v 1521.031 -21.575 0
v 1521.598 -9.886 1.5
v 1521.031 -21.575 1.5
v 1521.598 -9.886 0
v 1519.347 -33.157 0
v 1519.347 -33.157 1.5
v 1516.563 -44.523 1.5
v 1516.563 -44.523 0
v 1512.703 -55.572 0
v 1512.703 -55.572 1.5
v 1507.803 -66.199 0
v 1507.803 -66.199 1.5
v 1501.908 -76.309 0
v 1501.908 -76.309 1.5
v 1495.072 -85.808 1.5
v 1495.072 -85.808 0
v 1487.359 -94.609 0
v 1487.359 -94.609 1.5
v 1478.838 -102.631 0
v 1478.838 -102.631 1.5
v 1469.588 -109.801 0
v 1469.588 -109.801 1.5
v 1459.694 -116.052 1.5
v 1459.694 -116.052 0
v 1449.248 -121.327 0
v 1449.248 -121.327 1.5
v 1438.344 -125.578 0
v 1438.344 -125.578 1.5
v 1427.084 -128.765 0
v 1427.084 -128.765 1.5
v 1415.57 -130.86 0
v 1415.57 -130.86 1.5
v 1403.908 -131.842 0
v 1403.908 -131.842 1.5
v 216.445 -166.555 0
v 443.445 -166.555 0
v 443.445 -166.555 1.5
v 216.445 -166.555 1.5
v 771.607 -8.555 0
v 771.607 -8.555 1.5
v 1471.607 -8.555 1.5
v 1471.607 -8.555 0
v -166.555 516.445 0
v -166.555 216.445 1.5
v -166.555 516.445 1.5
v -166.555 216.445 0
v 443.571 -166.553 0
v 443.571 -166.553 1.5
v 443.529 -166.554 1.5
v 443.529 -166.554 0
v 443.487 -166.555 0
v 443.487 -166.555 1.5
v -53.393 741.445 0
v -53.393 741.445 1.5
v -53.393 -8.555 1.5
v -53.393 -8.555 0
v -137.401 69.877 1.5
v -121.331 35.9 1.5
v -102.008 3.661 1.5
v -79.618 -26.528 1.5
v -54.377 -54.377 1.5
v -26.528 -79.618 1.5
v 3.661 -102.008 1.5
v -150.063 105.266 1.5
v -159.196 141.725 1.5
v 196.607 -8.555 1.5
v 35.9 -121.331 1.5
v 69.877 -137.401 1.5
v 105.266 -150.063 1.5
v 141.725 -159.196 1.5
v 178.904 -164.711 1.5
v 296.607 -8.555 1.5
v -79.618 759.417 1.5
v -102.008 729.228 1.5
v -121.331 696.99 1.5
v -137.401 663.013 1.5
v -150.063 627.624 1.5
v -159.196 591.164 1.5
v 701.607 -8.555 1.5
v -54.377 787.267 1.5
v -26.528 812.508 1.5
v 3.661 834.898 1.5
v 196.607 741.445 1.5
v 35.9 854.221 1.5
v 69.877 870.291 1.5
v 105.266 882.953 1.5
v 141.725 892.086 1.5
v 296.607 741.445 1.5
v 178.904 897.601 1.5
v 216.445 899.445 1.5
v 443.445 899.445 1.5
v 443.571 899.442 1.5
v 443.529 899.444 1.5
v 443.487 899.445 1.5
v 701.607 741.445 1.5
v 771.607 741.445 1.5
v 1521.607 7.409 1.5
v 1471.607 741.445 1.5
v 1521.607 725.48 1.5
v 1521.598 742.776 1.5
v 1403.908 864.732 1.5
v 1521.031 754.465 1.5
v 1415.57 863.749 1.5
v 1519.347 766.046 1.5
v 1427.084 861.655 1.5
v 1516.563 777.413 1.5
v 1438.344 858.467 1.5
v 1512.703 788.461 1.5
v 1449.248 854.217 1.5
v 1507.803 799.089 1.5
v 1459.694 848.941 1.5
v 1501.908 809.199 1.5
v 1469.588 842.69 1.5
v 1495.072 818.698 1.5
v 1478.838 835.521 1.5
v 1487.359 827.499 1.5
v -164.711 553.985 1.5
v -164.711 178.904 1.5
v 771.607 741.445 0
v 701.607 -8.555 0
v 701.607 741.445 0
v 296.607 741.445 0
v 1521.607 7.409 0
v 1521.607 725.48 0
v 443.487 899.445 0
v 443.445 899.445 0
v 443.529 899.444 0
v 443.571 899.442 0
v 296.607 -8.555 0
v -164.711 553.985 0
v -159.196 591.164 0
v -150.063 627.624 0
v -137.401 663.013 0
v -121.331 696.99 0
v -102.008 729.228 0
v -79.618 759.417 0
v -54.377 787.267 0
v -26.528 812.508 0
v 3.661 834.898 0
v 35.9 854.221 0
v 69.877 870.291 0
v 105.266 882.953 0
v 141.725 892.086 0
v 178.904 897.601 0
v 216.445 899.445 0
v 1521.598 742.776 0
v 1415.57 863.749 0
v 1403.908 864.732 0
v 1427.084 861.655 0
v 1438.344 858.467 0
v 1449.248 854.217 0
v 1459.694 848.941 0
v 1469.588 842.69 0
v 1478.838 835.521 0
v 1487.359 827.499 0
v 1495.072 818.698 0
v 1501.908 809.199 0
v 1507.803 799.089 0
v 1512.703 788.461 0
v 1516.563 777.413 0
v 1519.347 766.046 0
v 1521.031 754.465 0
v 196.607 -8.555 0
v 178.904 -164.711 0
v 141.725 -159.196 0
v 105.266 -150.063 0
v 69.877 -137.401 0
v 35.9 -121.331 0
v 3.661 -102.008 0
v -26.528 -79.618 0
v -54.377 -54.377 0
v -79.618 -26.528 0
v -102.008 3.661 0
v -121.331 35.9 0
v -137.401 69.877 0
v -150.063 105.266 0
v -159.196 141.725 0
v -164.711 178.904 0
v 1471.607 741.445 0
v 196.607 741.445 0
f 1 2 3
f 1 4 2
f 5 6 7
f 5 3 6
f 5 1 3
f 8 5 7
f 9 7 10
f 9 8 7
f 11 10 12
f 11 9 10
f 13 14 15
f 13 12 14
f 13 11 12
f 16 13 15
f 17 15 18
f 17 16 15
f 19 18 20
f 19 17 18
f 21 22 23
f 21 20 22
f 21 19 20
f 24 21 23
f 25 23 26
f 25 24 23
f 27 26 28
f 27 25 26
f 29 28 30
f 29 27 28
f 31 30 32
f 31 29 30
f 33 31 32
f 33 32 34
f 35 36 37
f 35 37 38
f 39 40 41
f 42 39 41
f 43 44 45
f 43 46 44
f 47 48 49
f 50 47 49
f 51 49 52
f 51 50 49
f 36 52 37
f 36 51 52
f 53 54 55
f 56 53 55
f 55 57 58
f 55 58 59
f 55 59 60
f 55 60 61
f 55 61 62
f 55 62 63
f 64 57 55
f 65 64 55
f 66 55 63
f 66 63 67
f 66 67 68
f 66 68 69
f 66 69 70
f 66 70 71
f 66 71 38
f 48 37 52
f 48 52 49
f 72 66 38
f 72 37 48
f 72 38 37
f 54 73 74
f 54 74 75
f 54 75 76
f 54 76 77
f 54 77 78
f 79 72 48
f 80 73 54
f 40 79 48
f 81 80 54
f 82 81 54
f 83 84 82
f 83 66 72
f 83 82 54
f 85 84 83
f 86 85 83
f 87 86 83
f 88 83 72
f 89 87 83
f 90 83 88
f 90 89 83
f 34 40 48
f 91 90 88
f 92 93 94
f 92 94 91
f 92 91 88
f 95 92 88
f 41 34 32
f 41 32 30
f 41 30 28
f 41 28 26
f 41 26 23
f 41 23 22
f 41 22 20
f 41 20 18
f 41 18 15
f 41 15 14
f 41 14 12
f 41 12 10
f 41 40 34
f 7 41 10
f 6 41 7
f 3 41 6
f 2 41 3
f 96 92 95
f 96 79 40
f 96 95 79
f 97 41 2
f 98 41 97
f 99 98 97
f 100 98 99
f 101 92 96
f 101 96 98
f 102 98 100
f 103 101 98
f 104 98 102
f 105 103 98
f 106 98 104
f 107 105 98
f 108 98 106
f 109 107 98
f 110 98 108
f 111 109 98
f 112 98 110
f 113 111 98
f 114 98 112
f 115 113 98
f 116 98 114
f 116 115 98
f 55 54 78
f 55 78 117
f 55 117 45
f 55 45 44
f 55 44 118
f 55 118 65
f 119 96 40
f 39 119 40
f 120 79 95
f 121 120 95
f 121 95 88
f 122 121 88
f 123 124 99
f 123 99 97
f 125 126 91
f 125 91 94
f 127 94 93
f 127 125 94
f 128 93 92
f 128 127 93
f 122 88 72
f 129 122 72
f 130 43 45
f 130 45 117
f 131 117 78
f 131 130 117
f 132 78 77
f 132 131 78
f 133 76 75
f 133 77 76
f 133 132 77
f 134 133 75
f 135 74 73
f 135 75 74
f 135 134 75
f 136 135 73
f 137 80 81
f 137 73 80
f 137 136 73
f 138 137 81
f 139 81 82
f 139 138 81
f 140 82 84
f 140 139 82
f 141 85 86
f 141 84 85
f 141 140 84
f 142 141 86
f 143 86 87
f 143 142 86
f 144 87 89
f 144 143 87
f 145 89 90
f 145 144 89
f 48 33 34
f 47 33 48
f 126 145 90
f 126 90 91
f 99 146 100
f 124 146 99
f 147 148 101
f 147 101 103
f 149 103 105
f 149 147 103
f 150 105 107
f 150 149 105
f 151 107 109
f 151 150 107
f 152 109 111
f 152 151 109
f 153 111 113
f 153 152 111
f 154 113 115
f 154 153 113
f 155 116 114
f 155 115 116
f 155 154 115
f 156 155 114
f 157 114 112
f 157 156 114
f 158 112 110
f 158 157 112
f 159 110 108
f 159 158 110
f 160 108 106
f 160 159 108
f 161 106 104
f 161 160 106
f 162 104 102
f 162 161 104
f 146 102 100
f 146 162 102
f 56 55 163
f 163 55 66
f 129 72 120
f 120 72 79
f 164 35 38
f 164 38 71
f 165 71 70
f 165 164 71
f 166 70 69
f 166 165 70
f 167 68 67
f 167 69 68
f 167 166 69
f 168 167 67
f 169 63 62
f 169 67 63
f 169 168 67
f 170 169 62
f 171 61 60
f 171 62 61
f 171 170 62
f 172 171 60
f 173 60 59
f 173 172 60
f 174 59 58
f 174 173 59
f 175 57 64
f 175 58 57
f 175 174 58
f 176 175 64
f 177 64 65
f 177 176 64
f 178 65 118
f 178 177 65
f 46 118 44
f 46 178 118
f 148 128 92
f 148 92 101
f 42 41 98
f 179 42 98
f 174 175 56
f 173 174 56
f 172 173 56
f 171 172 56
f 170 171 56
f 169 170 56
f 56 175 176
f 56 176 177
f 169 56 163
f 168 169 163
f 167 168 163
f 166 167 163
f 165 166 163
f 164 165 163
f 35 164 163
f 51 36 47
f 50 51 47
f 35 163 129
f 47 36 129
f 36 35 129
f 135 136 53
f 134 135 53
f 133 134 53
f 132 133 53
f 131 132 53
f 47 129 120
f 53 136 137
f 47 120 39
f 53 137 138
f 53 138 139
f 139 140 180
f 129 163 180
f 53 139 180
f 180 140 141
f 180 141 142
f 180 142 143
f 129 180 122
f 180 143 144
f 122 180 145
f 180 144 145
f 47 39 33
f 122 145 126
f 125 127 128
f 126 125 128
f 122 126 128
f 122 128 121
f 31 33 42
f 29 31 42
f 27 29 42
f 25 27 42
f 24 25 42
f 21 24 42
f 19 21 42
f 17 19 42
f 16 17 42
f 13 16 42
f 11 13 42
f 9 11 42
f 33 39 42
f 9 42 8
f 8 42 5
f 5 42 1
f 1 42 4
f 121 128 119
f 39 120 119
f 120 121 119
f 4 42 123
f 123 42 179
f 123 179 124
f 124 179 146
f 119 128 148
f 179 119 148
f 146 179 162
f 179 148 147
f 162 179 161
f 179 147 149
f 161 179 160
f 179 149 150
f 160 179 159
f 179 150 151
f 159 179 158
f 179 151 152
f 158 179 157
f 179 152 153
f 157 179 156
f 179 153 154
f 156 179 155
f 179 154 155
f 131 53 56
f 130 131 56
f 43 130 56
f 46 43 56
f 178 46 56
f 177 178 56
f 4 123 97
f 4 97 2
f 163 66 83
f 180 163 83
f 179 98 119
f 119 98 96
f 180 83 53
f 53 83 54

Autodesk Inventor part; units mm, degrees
ref_plane "YZ Plane" through (0, 0, 0) normal (1, 0, 0) x (0, 1, 0)
ref_plane "XZ Plane" through (0, 0, 0) normal (0, 1, 0) x (-1, 0, 0)
ref_plane "XY Plane" through (0, 0, 0) normal (0, 0, 1) x (1, 0, 0)
sketch "Sketch1" plane through (0, 0, 0) normal (0, 0, 1) x (1, 0, 0)
  arc A0 (216.4448, 899.4448) -> (-166.5552, 516.4448) centre (216.4448, 516.4448) ccw
  line L0 (-166.5552, 216.4448) -> (-166.5552, 516.4448)
  arc A1 (-166.5552, 216.4448) -> (216.4448, -166.5552) centre (216.4448, 216.4448) ccw
  line L1 (443.4448, -166.5552) -> (216.4448, -166.5552)
  line L2 (216.4448, 899.4448) -> (443.4448, 899.4448)
  line L3 (443.5712, 899.4425) -> (1403.908, 864.732)
  line L4 (1403.908, -131.8425) -> (443.5712, -166.5529)
  arc A2 (443.4448, -166.5552) -> (443.5712, -166.5529) centre (443.4448, -163.0552) ccw
  arc A3 (443.5712, 899.4425) -> (443.4448, 899.4448) centre (443.4448, 895.9448) ccw
  arc A4 (1521.5977, 742.7757) -> (1403.908, 864.732) centre (1399.4977, 742.7117) ccw
  line L5 (1521.5977, 742.7757) -> (1521.6067, 725.4805)
  line L6 (1521.6067, 7.4091) -> (1521.5977, -9.8861)
  arc A5 (1403.908, -131.8425) -> (1521.5977, -9.8861) centre (1399.4977, -9.8222) ccw
  line L7 (1521.6067, 725.4805) -> (1521.6067, 7.4091)
  point P0 (0, 0)
extrude "Plate1" add sketch "Sketch1" along normal blind 1.5
sketch "Sketch2" plane through (0, 0, 1.5) normal (0, 0, 1) x (1, 0, 0)
  line L0 (771.6067, -8.5552) -> (1471.6067, -8.5552)
  line L1 (1471.6067, -8.5552) -> (1471.6067, 741.4448)
  line L2 (1471.6067, 741.4448) -> (771.6067, 741.4448)
  line L3 (771.6067, 741.4448) -> (771.6067, -8.5552)
  arc A0 (443.5712, 899.4425) -> (443.4448, 899.4448) centre (443.4448, 895.9448) ccw projected
  line L4 (216.4448, 899.4448) -> (443.4448, 899.4448) projected
  arc A1 (216.4448, 899.4448) -> (-166.5552, 516.4448) centre (216.4448, 516.4448) ccw projected
  line L5 (-166.5552, 216.4448) -> (-166.5552, 516.4448) projected
  arc A2 (-166.5552, 216.4448) -> (216.4448, -166.5552) centre (216.4448, 216.4448) ccw projected
  line L6 (443.4448, -166.5552) -> (216.4448, -166.5552) projected
  arc A3 (443.4448, -166.5552) -> (443.5712, -166.5529) centre (443.4448, -163.0552) ccw projected
  line L7 (1403.908, -131.8425) -> (443.5712, -166.5529) projected
  arc A4 (1403.908, -131.8425) -> (1521.5977, -9.8861) centre (1399.4977, -9.8222) ccw projected
  line L8 (1521.6067, 7.4091) -> (1521.5977, -9.8861) projected
  line L9 (1521.6067, 725.4805) -> (1521.6067, 7.4091) projected
  line L10 (1521.5977, 742.7757) -> (1521.6067, 725.4805) projected
  arc A5 (1521.5977, 742.7757) -> (1403.908, 864.732) centre (1399.4977, 742.7117) ccw projected
  line L11 (443.5712, 899.4425) -> (1403.908, 864.732) projected
  line L12 (296.6067, -8.5552) -> (701.6067, -8.5552)
  line L13 (701.6067, -8.5552) -> (701.6067, 741.4448)
  line L14 (701.6067, 741.4448) -> (296.6067, 741.4448)
  line L15 (296.6067, 741.4448) -> (296.6067, -8.5552)
  line L16 (-53.3933, -8.5552) -> (196.6067, -8.5552)
  line L17 (196.6067, -8.5552) -> (196.6067, 741.4448)
  line L18 (196.6067, 741.4448) -> (-53.3933, 741.4448)
  line L19 (-53.3933, 741.4448) -> (-53.3933, -8.5552)
  point P0 (0, 0)
  point P1 (1471.6067, 366.4448)
  point P2 (1521.6067, 366.4448)
  point P3 (701.6067, 366.4448)
  point P4 (771.6067, 366.4448)
  point P5 (196.6067, 366.4448)
  point P6 (296.6067, 366.4448)
  dimension "d1" = 50
  dimension "d2" = 750
  dimension "d3" = 700
  dimension "d4" = 750
  dimension "d5" = 70
  dimension "d6" = 405
  dimension "d7" = 750
  dimension "d8" = 100
  dimension "d9" = 250
extrude "Extrusion1" cut sketch "Sketch2" against normal through all contours L3 L2 L1 L0 | L15 L14 L13 L12 | L19 L18 L17 L16
equation "\"d0\" = Thickness"
equation "\"BendRadius\" = Thickness"
equation "\"BendReliefWidth\" = Thickness"
equation "\"BendReliefDepth\" = 0.5 * Thickness"
equation "\"CornerReliefSize\" = 4 * Thickness"
equation "\"MinimumRemnant\" = 2 * Thickness"
equation "\"TransitionRadius\" = BendRadius"
equation "\"JacobiRadiusSize\" = BendRadius"
equation "\"GapSize\" = Thickness"
equation "\"Thickness\" = 1.5"
properties part number "CHAPA_6"
